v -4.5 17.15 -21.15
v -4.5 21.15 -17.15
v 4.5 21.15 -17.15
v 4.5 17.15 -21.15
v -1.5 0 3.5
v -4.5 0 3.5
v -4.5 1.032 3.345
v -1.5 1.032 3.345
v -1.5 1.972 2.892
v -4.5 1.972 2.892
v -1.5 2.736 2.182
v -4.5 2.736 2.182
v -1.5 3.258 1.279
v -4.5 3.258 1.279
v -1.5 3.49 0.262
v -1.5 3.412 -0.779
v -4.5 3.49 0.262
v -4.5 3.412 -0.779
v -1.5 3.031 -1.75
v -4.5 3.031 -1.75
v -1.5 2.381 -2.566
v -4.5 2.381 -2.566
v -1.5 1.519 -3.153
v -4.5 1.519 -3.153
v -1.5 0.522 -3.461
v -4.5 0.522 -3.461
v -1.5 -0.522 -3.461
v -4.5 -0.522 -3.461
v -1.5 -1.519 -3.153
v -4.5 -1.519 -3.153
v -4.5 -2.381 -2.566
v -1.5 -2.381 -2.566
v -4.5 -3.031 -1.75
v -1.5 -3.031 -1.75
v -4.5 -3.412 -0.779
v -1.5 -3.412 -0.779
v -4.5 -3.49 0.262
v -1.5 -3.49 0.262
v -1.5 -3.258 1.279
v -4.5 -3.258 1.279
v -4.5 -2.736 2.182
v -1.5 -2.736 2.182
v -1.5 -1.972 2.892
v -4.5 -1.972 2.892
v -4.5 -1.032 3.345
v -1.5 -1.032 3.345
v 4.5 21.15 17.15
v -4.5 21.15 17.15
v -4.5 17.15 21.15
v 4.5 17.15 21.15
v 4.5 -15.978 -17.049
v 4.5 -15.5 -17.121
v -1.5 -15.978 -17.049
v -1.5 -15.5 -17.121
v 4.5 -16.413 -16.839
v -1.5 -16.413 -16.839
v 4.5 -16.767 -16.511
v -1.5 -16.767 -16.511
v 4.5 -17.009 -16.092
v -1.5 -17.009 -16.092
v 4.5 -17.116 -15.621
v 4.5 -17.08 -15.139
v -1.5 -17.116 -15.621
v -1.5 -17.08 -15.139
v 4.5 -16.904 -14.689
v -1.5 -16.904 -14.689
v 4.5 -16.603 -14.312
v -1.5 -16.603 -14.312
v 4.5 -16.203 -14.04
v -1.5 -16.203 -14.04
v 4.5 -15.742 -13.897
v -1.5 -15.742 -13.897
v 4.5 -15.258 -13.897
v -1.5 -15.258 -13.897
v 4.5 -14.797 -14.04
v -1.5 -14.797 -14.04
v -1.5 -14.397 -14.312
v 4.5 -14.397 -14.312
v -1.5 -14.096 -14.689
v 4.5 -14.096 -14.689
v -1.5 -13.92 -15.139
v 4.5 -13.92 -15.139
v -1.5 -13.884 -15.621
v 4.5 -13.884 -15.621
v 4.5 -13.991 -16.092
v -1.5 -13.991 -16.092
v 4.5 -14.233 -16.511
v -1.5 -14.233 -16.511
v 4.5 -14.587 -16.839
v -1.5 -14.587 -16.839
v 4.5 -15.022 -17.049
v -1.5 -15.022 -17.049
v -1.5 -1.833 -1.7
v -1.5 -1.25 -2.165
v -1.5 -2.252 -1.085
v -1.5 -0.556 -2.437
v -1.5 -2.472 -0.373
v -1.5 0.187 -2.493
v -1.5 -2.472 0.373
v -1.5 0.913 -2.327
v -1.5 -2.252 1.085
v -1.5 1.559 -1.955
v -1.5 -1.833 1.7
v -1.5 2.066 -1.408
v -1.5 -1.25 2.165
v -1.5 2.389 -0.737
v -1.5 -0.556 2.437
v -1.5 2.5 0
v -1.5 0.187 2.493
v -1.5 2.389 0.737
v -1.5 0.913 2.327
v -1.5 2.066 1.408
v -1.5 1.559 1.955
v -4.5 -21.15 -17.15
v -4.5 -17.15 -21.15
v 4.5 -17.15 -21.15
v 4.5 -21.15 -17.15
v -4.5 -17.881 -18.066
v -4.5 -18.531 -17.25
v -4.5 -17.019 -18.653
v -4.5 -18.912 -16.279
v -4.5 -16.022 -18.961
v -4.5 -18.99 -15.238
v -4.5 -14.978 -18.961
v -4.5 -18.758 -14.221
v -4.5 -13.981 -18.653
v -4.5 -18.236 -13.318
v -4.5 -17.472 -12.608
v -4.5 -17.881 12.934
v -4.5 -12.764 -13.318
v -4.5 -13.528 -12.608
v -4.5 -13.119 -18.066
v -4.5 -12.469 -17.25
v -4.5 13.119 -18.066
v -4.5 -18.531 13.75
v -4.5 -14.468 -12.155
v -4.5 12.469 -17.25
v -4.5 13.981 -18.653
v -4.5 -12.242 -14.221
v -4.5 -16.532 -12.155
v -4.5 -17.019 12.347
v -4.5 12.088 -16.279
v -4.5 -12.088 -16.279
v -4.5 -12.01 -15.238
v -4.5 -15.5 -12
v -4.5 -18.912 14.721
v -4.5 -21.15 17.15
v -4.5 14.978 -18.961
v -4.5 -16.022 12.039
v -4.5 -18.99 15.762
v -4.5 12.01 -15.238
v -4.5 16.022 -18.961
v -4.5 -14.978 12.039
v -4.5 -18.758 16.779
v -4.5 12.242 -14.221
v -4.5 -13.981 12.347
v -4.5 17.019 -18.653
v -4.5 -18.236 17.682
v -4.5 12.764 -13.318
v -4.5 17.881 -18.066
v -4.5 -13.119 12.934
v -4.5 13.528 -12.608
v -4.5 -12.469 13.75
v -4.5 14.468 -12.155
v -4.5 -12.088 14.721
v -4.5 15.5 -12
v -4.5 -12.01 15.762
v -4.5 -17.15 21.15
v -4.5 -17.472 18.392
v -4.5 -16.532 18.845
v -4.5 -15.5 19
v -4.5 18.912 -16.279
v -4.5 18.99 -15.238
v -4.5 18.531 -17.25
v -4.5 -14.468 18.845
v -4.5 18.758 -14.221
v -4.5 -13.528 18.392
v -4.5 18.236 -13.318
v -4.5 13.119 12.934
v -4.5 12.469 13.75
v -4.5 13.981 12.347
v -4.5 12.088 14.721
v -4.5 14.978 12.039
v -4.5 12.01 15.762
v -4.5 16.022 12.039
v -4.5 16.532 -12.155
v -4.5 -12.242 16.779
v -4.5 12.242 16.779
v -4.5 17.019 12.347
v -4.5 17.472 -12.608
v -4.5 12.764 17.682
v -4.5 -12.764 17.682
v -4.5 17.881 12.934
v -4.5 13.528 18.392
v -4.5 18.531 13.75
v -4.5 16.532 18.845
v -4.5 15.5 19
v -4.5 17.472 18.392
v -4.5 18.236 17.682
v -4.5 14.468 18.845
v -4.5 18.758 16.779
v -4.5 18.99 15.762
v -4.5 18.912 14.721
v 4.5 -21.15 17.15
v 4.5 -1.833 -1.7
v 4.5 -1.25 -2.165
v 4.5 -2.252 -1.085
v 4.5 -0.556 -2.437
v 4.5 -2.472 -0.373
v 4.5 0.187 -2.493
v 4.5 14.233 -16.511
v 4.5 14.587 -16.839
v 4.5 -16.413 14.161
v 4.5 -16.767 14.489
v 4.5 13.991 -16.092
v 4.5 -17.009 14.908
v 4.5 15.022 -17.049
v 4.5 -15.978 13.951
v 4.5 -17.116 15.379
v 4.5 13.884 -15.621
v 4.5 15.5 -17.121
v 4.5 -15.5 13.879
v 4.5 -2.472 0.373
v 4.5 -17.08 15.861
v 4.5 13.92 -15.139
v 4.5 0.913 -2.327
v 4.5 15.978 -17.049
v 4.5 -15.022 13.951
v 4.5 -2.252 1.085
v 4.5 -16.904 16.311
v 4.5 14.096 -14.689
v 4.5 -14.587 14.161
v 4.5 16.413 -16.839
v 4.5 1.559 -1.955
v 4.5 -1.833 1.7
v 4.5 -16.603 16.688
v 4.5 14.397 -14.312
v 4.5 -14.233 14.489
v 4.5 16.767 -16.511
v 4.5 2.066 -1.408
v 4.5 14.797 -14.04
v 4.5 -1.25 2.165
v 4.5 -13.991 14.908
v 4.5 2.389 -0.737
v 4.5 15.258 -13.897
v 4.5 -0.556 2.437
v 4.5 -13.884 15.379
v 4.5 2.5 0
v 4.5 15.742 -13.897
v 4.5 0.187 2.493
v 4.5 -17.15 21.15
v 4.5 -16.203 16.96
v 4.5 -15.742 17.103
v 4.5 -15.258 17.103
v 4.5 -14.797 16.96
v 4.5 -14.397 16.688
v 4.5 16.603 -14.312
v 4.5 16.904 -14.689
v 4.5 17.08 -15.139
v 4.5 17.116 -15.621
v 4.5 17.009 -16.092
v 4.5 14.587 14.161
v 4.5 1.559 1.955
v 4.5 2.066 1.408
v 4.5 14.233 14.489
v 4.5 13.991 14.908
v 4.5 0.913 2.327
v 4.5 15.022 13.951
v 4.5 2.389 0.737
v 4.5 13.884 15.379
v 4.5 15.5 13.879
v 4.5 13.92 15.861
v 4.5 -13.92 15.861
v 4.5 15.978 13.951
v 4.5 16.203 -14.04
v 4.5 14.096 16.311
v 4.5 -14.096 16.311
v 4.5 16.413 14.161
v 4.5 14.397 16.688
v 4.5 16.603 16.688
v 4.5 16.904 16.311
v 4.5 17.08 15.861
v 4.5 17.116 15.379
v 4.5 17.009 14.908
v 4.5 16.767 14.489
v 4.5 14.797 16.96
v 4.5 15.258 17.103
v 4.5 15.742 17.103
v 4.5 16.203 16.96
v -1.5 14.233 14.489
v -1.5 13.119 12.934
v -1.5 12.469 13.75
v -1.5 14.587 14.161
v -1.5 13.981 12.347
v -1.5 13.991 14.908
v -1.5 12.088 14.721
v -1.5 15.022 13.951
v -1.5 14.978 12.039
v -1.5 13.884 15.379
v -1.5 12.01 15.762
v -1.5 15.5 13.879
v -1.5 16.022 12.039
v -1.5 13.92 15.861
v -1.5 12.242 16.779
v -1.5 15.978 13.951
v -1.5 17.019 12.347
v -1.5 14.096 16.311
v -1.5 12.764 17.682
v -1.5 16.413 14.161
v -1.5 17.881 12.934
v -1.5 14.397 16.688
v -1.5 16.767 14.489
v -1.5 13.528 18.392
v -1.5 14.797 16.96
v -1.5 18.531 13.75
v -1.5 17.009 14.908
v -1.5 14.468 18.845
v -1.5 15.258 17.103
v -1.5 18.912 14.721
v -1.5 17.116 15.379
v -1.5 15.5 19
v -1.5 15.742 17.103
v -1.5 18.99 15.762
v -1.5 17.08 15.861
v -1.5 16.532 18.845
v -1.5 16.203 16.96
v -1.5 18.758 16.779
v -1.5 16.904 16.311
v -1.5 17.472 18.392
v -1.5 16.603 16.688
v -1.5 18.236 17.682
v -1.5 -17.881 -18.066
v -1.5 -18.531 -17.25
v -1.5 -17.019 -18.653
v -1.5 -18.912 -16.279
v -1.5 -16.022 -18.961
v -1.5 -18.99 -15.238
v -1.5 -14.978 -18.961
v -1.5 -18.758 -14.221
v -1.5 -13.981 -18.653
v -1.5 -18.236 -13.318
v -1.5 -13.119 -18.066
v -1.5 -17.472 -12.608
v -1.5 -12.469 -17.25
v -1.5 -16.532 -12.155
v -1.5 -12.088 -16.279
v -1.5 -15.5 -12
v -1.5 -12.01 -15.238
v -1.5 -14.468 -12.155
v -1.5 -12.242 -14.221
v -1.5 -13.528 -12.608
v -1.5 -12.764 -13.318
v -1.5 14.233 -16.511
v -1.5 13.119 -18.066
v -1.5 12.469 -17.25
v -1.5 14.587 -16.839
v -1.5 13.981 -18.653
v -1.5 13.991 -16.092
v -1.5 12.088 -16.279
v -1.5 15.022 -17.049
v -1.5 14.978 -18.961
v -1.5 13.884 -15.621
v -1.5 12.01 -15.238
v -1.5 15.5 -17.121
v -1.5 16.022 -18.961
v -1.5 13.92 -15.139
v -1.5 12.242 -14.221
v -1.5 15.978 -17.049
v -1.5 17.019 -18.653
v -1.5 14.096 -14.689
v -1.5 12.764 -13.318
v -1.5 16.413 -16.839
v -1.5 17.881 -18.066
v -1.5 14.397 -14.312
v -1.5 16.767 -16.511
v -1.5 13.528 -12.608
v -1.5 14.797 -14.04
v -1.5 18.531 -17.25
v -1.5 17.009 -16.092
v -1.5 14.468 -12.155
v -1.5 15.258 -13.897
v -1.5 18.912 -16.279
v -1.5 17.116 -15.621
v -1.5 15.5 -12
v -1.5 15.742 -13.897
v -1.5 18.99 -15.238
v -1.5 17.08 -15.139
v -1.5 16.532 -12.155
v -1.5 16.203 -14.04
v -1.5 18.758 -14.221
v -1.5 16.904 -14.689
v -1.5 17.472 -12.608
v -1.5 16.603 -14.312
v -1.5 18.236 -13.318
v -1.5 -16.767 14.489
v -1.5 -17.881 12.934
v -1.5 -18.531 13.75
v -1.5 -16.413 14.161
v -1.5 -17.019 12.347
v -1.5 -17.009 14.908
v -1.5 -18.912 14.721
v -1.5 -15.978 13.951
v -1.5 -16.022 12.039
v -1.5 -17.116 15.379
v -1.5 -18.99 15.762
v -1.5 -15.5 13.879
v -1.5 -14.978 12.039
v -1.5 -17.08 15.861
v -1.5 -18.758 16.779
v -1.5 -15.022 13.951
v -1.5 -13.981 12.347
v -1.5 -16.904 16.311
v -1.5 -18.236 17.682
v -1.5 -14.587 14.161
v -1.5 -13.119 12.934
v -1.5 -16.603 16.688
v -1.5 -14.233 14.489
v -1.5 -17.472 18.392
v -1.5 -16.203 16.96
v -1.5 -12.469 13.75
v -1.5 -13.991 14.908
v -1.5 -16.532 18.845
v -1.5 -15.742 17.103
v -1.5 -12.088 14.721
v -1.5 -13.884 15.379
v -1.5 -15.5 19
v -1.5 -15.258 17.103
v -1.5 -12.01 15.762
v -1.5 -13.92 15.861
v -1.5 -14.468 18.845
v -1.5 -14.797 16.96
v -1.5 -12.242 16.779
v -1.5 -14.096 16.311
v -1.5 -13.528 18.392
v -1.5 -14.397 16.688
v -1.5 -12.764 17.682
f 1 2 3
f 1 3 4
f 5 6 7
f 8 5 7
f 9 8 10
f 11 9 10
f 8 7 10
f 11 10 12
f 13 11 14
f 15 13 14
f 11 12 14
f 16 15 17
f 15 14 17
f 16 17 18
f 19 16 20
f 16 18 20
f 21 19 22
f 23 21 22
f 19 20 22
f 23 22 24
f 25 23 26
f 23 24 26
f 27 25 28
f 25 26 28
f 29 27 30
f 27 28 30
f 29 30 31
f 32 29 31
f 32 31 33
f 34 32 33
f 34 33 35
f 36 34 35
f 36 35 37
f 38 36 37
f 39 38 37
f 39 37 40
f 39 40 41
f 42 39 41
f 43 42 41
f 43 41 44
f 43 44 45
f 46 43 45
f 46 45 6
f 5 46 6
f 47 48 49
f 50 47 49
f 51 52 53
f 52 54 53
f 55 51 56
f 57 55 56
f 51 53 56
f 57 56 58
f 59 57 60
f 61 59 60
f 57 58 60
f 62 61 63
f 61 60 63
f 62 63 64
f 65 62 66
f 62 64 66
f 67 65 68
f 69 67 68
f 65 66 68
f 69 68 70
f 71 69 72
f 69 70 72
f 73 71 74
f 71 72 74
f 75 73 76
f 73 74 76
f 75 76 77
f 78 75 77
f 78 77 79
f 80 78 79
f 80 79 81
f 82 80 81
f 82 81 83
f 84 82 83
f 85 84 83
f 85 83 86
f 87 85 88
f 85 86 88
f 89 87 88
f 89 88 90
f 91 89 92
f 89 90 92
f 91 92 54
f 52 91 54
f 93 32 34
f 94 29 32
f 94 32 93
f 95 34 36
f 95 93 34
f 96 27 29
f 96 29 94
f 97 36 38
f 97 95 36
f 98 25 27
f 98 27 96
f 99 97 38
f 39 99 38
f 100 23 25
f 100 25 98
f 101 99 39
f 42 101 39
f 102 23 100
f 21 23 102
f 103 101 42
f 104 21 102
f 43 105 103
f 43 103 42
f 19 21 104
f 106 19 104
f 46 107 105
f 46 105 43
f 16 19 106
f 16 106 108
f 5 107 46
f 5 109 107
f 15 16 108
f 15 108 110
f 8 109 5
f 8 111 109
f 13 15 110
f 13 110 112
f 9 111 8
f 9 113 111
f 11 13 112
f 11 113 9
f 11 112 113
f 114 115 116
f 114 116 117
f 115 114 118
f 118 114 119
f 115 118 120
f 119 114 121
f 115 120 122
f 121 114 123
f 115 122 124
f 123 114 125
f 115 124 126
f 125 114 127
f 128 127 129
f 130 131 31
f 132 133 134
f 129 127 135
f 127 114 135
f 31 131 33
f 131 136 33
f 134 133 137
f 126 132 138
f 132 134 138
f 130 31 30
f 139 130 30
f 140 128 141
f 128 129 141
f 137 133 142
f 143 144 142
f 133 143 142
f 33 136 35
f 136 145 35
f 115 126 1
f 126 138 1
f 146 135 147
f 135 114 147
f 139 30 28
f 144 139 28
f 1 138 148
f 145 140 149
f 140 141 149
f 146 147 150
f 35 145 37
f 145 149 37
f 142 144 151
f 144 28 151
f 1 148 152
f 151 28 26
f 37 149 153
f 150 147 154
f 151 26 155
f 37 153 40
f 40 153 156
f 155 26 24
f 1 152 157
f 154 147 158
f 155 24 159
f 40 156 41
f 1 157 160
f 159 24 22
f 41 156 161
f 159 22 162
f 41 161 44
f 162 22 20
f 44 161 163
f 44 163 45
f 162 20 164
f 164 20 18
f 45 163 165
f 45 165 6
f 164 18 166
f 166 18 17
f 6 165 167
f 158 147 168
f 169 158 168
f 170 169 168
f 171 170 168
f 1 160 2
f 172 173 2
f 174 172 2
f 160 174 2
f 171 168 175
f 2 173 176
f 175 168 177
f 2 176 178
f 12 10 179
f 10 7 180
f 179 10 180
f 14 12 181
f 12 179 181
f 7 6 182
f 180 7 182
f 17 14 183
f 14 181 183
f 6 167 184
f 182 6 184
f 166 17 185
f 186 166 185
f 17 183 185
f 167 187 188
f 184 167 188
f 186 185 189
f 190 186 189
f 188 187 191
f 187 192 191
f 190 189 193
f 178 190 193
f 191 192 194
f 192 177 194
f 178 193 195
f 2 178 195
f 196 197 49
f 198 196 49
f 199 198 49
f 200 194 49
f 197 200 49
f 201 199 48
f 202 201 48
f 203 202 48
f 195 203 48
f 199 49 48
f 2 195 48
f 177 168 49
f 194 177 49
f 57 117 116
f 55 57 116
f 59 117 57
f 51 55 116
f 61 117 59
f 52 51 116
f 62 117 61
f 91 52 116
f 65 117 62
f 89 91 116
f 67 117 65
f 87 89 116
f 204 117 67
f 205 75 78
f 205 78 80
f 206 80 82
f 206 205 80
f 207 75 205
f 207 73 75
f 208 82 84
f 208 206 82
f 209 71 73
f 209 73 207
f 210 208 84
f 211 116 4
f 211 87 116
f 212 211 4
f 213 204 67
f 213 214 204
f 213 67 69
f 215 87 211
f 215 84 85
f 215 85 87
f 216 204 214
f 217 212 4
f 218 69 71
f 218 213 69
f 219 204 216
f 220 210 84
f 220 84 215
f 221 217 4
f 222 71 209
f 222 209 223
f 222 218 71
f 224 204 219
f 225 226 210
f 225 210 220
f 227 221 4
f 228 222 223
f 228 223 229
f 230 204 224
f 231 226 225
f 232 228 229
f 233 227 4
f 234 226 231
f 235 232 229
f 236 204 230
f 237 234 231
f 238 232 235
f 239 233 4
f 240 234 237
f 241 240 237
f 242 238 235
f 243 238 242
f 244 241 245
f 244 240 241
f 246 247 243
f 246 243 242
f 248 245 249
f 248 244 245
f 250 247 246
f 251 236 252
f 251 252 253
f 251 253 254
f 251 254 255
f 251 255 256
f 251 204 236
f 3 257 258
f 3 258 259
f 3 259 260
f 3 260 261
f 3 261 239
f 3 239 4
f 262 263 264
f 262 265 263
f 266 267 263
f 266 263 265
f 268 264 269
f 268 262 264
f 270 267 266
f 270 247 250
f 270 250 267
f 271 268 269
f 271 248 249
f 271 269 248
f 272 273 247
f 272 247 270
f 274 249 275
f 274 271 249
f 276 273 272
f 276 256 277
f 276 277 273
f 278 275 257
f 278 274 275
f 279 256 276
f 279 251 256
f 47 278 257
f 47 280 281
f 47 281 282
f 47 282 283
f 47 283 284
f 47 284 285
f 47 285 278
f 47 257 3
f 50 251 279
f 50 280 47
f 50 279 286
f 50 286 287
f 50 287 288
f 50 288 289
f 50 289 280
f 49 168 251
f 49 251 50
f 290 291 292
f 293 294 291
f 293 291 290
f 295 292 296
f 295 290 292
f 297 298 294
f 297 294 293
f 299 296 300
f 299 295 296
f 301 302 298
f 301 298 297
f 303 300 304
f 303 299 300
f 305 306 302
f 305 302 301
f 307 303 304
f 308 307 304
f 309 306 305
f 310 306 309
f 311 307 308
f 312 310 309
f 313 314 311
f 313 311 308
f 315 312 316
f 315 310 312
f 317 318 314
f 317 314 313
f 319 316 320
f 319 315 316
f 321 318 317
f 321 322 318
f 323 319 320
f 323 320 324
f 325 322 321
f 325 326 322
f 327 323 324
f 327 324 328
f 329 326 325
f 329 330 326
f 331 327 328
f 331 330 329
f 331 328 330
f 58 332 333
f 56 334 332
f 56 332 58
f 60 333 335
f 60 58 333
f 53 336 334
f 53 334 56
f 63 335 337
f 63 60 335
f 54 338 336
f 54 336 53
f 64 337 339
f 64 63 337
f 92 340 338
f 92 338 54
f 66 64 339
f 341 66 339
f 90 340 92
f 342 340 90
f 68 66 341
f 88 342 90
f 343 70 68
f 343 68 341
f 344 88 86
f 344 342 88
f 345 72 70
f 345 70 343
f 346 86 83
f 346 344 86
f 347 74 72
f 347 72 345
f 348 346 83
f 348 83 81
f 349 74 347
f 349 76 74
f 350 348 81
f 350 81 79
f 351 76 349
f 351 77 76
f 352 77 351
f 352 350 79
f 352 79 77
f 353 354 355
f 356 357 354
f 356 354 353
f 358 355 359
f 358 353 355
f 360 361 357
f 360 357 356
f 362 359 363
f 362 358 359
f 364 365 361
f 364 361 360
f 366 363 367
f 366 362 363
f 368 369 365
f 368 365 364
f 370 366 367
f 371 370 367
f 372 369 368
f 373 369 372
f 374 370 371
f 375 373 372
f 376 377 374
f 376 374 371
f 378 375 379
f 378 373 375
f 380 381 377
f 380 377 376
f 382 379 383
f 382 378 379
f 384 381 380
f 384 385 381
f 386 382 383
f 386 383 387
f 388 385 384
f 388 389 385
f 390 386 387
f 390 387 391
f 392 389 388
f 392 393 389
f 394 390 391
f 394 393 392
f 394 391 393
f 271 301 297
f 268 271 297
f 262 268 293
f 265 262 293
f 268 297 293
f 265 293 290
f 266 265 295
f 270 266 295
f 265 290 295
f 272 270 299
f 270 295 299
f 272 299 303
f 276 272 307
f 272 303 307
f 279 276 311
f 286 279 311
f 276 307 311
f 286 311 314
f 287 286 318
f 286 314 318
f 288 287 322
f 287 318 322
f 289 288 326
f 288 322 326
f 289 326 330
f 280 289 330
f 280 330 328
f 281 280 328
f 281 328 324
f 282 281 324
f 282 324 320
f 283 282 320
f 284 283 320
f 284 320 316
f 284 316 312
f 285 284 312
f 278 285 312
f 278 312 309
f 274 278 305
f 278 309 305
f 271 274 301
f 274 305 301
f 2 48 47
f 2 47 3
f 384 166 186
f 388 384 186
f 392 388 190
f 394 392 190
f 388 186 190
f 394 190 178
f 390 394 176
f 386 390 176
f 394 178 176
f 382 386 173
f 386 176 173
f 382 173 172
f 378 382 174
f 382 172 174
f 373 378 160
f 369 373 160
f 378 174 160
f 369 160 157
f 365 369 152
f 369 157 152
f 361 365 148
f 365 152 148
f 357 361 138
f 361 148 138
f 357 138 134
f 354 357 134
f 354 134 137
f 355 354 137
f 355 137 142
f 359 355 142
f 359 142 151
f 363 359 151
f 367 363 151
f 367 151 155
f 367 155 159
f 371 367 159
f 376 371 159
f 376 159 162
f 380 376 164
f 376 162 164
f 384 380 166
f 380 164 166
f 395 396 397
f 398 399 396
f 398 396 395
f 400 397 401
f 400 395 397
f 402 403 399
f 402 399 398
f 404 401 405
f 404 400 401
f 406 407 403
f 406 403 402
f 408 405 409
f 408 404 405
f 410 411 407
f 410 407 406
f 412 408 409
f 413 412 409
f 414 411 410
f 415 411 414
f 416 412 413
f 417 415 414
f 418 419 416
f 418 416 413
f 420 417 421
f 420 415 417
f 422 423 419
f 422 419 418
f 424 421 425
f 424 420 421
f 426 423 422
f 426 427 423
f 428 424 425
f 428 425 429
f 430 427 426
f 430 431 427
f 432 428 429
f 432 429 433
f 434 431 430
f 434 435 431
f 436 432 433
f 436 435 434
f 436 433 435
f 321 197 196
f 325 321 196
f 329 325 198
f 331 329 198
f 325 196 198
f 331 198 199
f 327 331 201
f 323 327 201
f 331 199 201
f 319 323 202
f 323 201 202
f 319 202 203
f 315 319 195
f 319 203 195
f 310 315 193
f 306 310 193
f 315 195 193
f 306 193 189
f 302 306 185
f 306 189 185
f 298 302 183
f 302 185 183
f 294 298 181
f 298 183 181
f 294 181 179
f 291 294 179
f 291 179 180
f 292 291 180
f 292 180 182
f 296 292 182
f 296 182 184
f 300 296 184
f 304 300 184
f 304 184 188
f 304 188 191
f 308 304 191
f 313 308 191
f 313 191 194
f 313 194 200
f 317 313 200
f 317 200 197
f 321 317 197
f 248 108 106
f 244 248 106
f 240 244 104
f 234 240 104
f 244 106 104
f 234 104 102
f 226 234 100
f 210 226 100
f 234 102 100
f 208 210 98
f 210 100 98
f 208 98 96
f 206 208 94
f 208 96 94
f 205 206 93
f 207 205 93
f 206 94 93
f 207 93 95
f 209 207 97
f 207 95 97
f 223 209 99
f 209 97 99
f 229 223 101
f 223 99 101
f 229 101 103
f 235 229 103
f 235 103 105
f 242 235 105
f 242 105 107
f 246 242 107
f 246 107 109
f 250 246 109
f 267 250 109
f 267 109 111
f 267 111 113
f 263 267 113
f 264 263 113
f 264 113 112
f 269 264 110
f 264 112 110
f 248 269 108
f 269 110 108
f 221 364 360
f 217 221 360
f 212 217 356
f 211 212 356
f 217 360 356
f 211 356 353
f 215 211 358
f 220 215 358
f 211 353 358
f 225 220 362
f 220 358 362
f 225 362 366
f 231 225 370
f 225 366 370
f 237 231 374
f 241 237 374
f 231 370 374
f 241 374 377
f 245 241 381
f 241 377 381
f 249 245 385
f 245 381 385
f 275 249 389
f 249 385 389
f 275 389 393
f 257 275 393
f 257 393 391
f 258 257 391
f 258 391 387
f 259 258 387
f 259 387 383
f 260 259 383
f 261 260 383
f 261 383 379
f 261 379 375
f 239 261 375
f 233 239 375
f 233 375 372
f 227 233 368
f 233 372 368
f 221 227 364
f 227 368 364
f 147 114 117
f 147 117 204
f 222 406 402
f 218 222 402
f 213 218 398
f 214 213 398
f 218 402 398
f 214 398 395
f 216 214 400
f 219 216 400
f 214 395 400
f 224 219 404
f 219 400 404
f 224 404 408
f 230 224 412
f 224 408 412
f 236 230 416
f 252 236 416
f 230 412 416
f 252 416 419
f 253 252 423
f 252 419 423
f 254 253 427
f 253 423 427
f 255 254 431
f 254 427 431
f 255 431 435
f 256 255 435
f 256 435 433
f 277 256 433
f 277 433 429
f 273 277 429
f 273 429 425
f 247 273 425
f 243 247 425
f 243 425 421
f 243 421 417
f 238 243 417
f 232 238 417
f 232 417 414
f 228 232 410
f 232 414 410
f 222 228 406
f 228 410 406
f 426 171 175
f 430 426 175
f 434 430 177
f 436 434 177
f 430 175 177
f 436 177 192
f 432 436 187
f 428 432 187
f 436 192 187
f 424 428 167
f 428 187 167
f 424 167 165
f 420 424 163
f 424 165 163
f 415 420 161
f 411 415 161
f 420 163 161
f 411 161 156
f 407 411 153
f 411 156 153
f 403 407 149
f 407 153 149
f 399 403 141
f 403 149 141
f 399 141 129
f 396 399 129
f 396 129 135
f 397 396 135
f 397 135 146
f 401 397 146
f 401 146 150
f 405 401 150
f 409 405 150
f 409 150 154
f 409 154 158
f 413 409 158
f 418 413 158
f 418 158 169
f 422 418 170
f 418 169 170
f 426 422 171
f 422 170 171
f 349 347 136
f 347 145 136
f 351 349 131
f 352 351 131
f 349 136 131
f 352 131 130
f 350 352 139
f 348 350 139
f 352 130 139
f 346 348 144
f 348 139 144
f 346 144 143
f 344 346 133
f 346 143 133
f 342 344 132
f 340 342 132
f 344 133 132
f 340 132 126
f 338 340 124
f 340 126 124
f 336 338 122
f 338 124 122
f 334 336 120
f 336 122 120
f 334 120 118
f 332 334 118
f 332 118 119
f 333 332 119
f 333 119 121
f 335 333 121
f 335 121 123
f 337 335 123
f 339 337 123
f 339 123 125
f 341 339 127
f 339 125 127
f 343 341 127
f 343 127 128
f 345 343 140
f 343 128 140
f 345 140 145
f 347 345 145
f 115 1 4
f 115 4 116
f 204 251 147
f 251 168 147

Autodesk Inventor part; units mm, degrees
ref_plane "YZ Plane" through (0, 0, 0) normal (1, 0, 0) x (0, 1, 0)
ref_plane "XZ Plane" through (0, 0, 0) normal (0, 1, 0) x (-1, 0, 0)
ref_plane "XY Plane" through (0, 0, 0) normal (0, 0, 1) x (1, 0, 0)
sketch "Skizze1" plane through (0, 0, 0) normal (1, 0, 0) x (0, 1, 0)
  line L0 (-29.61, 0) -> (29.61, 0) projected
  line L1 (0, -29.61) -> (0, 29.61) projected
  line L2 (-17.15, 21.15) -> (17.15, 21.15)
  line L3 (21.15, 17.15) -> (21.15, -17.15)
  line L4 (17.15, -21.15) -> (-17.15, -21.15)
  line L5 (-21.15, -17.15) -> (-21.15, 17.15)
  line L6 (21.15, 17.15) -> (17.15, 21.15)
  line L7 (21.15, -17.15) -> (17.15, -21.15)
  line L8 (-17.15, -21.15) -> (-21.15, -17.15)
  line L9 (-17.15, 21.15) -> (-21.15, 17.15)
  circle A0 centre (0, 0) radius 2.5
  point P0 (-21.15, 21.15)
  point P1 (21.15, -21.15)
  point P2 (21.15, 21.15)
  point P3 (-21.15, -21.15)
  dimension "d0" = 42.3
  dimension "d1" = 42.3
  dimension "d5" = 4
  dimension "d6" = 4
  dimension "d7" = 4
  dimension "d8" = 4
  dimension "d9" = 4
  dimension "d10" = 4
  dimension "d11" = 4
  dimension "d12" = 4
  dimension "d13" = 5
extrude "Extrusion2" add sketch "Skizze1" along normal mid plane 9 contours L5 L9 L2 L1 A0 L0 | L0 A0 L1 L4 L8 L5 | L1 L2 L6 L3 L0 A0 | A0 L0 L3 L7 L4 L1
sketch "Skizze2" plane through (4.5, 0, 0) normal (1, 0, 0) x (0, 0, -1)
  circle A0 centre (0, 0) radius 2.5 projected
  line L0 (-17.15, 21.15) -> (-21.15, 17.15) projected
  line L1 (-21.15, 17.15) -> (-21.15, -17.15) projected
  line L2 (-21.15, -17.15) -> (-17.15, -21.15) projected
  line L3 (-17.15, -21.15) -> (17.15, -21.15) projected
  line L4 (17.15, -21.15) -> (21.15, -17.15) projected
  line L5 (21.15, -17.15) -> (21.15, 17.15) projected
  line L6 (21.15, 17.15) -> (17.15, 21.15) projected
  line L7 (17.15, 21.15) -> (-17.15, 21.15) projected
  line L8 (0, -29.61) -> (0, 29.61) projected
  line L9 (29.61, 0) -> (-29.61, 0) projected
  point P0 (-15.5, 15.5)
  point P1 (15.5, 15.5)
  point P2 (-15.5, -15.5)
  point P3 (15.5, -15.5)
  dimension "d18" = 15.5
  dimension "d19" = 15.5
hole "Bohrung1" at (4.5, 15.5, 15.5) at (4.5, 15.5, -15.5) at (4.5, -15.5, 15.5) at (4.5, -15.5, -15.5) direction (-1, 0, 0) diameter 3.242 end through all thread size "M4x0.7" class "6H" standard "ISO Metric profile"
sketch "Skizze4" plane through (-4.5, 0, 0) normal (-1, 0, 0) x (0, 0, 1)
  circle A0 centre (15.5, -15.5) radius 1.621 projected
  circle A1 centre (15.5, 15.5) radius 1.621 projected
  circle A2 centre (-15.5, 15.5) radius 1.621 projected
  circle A3 centre (-15.5, -15.5) radius 1.621 projected
  circle A4 centre (0, 0) radius 2.5 projected
  line L0 (21.15, 17.15) -> (17.15, 21.15) projected
  line L1 (17.15, 21.15) -> (-17.15, 21.15) projected
  line L2 (-17.15, 21.15) -> (-21.15, 17.15) projected
  line L3 (-21.15, 17.15) -> (-21.15, -17.15) projected
  line L4 (-21.15, -17.15) -> (-17.15, -21.15) projected
  line L5 (-17.15, -21.15) -> (17.15, -21.15) projected
  line L6 (17.15, -21.15) -> (21.15, -17.15) projected
  line L7 (21.15, -17.15) -> (21.15, 17.15) projected
  circle A5 centre (15.5, 15.5) radius 3.5
  circle A6 centre (15.5, -15.5) radius 3.5
  circle A7 centre (-15.5, 15.5) radius 3.5
  circle A8 centre (-15.5, -15.5) radius 3.5
  dimension "d34" = 7
  dimension "d35" = 7
  dimension "d36" = 7
  dimension "d37" = 7
extrude "Extrusion4" cut sketch "Skizze4" against normal blind 3 contours A5 | A6 | A7 | A8
sketch "Skizze5" plane through (-4.5, 0, 0) normal (-1, 0, 0) x (0, 0, 1)
  circle A0 centre (-15.5, 15.5) radius 3.5 projected
  circle A1 centre (15.5, 15.5) radius 3.5 projected
  circle A2 centre (15.5, -15.5) radius 3.5 projected
  circle A3 centre (-15.5, -15.5) radius 3.5 projected
  circle A4 centre (0, 0) radius 2.5 projected
  line L0 (21.15, 17.15) -> (17.15, 21.15) projected
  line L1 (17.15, 21.15) -> (-17.15, 21.15) projected
  line L2 (-17.15, 21.15) -> (-21.15, 17.15) projected
  line L3 (-21.15, 17.15) -> (-21.15, -17.15) projected
  line L4 (-21.15, -17.15) -> (-17.15, -21.15) projected
  line L5 (-17.15, -21.15) -> (17.15, -21.15) projected
  line L6 (17.15, -21.15) -> (21.15, -17.15) projected
  line L7 (21.15, -17.15) -> (21.15, 17.15) projected
  circle A5 centre (0, 0) radius 3.5
  dimension "d40" = 7
extrude "Extrusion5" cut sketch "Skizze5" against normal blind 3 contours A5
equation "\"d6\" = d5"
equation "\"d8\" = d7"
equation "\"d9\" = d7"
equation "\"d10\" = d9"
equation "\"d11\" = d7"
equation "\"d12\" = d11"
properties part number "BackPlatte" material "Stahl, Kohlenstoff"
